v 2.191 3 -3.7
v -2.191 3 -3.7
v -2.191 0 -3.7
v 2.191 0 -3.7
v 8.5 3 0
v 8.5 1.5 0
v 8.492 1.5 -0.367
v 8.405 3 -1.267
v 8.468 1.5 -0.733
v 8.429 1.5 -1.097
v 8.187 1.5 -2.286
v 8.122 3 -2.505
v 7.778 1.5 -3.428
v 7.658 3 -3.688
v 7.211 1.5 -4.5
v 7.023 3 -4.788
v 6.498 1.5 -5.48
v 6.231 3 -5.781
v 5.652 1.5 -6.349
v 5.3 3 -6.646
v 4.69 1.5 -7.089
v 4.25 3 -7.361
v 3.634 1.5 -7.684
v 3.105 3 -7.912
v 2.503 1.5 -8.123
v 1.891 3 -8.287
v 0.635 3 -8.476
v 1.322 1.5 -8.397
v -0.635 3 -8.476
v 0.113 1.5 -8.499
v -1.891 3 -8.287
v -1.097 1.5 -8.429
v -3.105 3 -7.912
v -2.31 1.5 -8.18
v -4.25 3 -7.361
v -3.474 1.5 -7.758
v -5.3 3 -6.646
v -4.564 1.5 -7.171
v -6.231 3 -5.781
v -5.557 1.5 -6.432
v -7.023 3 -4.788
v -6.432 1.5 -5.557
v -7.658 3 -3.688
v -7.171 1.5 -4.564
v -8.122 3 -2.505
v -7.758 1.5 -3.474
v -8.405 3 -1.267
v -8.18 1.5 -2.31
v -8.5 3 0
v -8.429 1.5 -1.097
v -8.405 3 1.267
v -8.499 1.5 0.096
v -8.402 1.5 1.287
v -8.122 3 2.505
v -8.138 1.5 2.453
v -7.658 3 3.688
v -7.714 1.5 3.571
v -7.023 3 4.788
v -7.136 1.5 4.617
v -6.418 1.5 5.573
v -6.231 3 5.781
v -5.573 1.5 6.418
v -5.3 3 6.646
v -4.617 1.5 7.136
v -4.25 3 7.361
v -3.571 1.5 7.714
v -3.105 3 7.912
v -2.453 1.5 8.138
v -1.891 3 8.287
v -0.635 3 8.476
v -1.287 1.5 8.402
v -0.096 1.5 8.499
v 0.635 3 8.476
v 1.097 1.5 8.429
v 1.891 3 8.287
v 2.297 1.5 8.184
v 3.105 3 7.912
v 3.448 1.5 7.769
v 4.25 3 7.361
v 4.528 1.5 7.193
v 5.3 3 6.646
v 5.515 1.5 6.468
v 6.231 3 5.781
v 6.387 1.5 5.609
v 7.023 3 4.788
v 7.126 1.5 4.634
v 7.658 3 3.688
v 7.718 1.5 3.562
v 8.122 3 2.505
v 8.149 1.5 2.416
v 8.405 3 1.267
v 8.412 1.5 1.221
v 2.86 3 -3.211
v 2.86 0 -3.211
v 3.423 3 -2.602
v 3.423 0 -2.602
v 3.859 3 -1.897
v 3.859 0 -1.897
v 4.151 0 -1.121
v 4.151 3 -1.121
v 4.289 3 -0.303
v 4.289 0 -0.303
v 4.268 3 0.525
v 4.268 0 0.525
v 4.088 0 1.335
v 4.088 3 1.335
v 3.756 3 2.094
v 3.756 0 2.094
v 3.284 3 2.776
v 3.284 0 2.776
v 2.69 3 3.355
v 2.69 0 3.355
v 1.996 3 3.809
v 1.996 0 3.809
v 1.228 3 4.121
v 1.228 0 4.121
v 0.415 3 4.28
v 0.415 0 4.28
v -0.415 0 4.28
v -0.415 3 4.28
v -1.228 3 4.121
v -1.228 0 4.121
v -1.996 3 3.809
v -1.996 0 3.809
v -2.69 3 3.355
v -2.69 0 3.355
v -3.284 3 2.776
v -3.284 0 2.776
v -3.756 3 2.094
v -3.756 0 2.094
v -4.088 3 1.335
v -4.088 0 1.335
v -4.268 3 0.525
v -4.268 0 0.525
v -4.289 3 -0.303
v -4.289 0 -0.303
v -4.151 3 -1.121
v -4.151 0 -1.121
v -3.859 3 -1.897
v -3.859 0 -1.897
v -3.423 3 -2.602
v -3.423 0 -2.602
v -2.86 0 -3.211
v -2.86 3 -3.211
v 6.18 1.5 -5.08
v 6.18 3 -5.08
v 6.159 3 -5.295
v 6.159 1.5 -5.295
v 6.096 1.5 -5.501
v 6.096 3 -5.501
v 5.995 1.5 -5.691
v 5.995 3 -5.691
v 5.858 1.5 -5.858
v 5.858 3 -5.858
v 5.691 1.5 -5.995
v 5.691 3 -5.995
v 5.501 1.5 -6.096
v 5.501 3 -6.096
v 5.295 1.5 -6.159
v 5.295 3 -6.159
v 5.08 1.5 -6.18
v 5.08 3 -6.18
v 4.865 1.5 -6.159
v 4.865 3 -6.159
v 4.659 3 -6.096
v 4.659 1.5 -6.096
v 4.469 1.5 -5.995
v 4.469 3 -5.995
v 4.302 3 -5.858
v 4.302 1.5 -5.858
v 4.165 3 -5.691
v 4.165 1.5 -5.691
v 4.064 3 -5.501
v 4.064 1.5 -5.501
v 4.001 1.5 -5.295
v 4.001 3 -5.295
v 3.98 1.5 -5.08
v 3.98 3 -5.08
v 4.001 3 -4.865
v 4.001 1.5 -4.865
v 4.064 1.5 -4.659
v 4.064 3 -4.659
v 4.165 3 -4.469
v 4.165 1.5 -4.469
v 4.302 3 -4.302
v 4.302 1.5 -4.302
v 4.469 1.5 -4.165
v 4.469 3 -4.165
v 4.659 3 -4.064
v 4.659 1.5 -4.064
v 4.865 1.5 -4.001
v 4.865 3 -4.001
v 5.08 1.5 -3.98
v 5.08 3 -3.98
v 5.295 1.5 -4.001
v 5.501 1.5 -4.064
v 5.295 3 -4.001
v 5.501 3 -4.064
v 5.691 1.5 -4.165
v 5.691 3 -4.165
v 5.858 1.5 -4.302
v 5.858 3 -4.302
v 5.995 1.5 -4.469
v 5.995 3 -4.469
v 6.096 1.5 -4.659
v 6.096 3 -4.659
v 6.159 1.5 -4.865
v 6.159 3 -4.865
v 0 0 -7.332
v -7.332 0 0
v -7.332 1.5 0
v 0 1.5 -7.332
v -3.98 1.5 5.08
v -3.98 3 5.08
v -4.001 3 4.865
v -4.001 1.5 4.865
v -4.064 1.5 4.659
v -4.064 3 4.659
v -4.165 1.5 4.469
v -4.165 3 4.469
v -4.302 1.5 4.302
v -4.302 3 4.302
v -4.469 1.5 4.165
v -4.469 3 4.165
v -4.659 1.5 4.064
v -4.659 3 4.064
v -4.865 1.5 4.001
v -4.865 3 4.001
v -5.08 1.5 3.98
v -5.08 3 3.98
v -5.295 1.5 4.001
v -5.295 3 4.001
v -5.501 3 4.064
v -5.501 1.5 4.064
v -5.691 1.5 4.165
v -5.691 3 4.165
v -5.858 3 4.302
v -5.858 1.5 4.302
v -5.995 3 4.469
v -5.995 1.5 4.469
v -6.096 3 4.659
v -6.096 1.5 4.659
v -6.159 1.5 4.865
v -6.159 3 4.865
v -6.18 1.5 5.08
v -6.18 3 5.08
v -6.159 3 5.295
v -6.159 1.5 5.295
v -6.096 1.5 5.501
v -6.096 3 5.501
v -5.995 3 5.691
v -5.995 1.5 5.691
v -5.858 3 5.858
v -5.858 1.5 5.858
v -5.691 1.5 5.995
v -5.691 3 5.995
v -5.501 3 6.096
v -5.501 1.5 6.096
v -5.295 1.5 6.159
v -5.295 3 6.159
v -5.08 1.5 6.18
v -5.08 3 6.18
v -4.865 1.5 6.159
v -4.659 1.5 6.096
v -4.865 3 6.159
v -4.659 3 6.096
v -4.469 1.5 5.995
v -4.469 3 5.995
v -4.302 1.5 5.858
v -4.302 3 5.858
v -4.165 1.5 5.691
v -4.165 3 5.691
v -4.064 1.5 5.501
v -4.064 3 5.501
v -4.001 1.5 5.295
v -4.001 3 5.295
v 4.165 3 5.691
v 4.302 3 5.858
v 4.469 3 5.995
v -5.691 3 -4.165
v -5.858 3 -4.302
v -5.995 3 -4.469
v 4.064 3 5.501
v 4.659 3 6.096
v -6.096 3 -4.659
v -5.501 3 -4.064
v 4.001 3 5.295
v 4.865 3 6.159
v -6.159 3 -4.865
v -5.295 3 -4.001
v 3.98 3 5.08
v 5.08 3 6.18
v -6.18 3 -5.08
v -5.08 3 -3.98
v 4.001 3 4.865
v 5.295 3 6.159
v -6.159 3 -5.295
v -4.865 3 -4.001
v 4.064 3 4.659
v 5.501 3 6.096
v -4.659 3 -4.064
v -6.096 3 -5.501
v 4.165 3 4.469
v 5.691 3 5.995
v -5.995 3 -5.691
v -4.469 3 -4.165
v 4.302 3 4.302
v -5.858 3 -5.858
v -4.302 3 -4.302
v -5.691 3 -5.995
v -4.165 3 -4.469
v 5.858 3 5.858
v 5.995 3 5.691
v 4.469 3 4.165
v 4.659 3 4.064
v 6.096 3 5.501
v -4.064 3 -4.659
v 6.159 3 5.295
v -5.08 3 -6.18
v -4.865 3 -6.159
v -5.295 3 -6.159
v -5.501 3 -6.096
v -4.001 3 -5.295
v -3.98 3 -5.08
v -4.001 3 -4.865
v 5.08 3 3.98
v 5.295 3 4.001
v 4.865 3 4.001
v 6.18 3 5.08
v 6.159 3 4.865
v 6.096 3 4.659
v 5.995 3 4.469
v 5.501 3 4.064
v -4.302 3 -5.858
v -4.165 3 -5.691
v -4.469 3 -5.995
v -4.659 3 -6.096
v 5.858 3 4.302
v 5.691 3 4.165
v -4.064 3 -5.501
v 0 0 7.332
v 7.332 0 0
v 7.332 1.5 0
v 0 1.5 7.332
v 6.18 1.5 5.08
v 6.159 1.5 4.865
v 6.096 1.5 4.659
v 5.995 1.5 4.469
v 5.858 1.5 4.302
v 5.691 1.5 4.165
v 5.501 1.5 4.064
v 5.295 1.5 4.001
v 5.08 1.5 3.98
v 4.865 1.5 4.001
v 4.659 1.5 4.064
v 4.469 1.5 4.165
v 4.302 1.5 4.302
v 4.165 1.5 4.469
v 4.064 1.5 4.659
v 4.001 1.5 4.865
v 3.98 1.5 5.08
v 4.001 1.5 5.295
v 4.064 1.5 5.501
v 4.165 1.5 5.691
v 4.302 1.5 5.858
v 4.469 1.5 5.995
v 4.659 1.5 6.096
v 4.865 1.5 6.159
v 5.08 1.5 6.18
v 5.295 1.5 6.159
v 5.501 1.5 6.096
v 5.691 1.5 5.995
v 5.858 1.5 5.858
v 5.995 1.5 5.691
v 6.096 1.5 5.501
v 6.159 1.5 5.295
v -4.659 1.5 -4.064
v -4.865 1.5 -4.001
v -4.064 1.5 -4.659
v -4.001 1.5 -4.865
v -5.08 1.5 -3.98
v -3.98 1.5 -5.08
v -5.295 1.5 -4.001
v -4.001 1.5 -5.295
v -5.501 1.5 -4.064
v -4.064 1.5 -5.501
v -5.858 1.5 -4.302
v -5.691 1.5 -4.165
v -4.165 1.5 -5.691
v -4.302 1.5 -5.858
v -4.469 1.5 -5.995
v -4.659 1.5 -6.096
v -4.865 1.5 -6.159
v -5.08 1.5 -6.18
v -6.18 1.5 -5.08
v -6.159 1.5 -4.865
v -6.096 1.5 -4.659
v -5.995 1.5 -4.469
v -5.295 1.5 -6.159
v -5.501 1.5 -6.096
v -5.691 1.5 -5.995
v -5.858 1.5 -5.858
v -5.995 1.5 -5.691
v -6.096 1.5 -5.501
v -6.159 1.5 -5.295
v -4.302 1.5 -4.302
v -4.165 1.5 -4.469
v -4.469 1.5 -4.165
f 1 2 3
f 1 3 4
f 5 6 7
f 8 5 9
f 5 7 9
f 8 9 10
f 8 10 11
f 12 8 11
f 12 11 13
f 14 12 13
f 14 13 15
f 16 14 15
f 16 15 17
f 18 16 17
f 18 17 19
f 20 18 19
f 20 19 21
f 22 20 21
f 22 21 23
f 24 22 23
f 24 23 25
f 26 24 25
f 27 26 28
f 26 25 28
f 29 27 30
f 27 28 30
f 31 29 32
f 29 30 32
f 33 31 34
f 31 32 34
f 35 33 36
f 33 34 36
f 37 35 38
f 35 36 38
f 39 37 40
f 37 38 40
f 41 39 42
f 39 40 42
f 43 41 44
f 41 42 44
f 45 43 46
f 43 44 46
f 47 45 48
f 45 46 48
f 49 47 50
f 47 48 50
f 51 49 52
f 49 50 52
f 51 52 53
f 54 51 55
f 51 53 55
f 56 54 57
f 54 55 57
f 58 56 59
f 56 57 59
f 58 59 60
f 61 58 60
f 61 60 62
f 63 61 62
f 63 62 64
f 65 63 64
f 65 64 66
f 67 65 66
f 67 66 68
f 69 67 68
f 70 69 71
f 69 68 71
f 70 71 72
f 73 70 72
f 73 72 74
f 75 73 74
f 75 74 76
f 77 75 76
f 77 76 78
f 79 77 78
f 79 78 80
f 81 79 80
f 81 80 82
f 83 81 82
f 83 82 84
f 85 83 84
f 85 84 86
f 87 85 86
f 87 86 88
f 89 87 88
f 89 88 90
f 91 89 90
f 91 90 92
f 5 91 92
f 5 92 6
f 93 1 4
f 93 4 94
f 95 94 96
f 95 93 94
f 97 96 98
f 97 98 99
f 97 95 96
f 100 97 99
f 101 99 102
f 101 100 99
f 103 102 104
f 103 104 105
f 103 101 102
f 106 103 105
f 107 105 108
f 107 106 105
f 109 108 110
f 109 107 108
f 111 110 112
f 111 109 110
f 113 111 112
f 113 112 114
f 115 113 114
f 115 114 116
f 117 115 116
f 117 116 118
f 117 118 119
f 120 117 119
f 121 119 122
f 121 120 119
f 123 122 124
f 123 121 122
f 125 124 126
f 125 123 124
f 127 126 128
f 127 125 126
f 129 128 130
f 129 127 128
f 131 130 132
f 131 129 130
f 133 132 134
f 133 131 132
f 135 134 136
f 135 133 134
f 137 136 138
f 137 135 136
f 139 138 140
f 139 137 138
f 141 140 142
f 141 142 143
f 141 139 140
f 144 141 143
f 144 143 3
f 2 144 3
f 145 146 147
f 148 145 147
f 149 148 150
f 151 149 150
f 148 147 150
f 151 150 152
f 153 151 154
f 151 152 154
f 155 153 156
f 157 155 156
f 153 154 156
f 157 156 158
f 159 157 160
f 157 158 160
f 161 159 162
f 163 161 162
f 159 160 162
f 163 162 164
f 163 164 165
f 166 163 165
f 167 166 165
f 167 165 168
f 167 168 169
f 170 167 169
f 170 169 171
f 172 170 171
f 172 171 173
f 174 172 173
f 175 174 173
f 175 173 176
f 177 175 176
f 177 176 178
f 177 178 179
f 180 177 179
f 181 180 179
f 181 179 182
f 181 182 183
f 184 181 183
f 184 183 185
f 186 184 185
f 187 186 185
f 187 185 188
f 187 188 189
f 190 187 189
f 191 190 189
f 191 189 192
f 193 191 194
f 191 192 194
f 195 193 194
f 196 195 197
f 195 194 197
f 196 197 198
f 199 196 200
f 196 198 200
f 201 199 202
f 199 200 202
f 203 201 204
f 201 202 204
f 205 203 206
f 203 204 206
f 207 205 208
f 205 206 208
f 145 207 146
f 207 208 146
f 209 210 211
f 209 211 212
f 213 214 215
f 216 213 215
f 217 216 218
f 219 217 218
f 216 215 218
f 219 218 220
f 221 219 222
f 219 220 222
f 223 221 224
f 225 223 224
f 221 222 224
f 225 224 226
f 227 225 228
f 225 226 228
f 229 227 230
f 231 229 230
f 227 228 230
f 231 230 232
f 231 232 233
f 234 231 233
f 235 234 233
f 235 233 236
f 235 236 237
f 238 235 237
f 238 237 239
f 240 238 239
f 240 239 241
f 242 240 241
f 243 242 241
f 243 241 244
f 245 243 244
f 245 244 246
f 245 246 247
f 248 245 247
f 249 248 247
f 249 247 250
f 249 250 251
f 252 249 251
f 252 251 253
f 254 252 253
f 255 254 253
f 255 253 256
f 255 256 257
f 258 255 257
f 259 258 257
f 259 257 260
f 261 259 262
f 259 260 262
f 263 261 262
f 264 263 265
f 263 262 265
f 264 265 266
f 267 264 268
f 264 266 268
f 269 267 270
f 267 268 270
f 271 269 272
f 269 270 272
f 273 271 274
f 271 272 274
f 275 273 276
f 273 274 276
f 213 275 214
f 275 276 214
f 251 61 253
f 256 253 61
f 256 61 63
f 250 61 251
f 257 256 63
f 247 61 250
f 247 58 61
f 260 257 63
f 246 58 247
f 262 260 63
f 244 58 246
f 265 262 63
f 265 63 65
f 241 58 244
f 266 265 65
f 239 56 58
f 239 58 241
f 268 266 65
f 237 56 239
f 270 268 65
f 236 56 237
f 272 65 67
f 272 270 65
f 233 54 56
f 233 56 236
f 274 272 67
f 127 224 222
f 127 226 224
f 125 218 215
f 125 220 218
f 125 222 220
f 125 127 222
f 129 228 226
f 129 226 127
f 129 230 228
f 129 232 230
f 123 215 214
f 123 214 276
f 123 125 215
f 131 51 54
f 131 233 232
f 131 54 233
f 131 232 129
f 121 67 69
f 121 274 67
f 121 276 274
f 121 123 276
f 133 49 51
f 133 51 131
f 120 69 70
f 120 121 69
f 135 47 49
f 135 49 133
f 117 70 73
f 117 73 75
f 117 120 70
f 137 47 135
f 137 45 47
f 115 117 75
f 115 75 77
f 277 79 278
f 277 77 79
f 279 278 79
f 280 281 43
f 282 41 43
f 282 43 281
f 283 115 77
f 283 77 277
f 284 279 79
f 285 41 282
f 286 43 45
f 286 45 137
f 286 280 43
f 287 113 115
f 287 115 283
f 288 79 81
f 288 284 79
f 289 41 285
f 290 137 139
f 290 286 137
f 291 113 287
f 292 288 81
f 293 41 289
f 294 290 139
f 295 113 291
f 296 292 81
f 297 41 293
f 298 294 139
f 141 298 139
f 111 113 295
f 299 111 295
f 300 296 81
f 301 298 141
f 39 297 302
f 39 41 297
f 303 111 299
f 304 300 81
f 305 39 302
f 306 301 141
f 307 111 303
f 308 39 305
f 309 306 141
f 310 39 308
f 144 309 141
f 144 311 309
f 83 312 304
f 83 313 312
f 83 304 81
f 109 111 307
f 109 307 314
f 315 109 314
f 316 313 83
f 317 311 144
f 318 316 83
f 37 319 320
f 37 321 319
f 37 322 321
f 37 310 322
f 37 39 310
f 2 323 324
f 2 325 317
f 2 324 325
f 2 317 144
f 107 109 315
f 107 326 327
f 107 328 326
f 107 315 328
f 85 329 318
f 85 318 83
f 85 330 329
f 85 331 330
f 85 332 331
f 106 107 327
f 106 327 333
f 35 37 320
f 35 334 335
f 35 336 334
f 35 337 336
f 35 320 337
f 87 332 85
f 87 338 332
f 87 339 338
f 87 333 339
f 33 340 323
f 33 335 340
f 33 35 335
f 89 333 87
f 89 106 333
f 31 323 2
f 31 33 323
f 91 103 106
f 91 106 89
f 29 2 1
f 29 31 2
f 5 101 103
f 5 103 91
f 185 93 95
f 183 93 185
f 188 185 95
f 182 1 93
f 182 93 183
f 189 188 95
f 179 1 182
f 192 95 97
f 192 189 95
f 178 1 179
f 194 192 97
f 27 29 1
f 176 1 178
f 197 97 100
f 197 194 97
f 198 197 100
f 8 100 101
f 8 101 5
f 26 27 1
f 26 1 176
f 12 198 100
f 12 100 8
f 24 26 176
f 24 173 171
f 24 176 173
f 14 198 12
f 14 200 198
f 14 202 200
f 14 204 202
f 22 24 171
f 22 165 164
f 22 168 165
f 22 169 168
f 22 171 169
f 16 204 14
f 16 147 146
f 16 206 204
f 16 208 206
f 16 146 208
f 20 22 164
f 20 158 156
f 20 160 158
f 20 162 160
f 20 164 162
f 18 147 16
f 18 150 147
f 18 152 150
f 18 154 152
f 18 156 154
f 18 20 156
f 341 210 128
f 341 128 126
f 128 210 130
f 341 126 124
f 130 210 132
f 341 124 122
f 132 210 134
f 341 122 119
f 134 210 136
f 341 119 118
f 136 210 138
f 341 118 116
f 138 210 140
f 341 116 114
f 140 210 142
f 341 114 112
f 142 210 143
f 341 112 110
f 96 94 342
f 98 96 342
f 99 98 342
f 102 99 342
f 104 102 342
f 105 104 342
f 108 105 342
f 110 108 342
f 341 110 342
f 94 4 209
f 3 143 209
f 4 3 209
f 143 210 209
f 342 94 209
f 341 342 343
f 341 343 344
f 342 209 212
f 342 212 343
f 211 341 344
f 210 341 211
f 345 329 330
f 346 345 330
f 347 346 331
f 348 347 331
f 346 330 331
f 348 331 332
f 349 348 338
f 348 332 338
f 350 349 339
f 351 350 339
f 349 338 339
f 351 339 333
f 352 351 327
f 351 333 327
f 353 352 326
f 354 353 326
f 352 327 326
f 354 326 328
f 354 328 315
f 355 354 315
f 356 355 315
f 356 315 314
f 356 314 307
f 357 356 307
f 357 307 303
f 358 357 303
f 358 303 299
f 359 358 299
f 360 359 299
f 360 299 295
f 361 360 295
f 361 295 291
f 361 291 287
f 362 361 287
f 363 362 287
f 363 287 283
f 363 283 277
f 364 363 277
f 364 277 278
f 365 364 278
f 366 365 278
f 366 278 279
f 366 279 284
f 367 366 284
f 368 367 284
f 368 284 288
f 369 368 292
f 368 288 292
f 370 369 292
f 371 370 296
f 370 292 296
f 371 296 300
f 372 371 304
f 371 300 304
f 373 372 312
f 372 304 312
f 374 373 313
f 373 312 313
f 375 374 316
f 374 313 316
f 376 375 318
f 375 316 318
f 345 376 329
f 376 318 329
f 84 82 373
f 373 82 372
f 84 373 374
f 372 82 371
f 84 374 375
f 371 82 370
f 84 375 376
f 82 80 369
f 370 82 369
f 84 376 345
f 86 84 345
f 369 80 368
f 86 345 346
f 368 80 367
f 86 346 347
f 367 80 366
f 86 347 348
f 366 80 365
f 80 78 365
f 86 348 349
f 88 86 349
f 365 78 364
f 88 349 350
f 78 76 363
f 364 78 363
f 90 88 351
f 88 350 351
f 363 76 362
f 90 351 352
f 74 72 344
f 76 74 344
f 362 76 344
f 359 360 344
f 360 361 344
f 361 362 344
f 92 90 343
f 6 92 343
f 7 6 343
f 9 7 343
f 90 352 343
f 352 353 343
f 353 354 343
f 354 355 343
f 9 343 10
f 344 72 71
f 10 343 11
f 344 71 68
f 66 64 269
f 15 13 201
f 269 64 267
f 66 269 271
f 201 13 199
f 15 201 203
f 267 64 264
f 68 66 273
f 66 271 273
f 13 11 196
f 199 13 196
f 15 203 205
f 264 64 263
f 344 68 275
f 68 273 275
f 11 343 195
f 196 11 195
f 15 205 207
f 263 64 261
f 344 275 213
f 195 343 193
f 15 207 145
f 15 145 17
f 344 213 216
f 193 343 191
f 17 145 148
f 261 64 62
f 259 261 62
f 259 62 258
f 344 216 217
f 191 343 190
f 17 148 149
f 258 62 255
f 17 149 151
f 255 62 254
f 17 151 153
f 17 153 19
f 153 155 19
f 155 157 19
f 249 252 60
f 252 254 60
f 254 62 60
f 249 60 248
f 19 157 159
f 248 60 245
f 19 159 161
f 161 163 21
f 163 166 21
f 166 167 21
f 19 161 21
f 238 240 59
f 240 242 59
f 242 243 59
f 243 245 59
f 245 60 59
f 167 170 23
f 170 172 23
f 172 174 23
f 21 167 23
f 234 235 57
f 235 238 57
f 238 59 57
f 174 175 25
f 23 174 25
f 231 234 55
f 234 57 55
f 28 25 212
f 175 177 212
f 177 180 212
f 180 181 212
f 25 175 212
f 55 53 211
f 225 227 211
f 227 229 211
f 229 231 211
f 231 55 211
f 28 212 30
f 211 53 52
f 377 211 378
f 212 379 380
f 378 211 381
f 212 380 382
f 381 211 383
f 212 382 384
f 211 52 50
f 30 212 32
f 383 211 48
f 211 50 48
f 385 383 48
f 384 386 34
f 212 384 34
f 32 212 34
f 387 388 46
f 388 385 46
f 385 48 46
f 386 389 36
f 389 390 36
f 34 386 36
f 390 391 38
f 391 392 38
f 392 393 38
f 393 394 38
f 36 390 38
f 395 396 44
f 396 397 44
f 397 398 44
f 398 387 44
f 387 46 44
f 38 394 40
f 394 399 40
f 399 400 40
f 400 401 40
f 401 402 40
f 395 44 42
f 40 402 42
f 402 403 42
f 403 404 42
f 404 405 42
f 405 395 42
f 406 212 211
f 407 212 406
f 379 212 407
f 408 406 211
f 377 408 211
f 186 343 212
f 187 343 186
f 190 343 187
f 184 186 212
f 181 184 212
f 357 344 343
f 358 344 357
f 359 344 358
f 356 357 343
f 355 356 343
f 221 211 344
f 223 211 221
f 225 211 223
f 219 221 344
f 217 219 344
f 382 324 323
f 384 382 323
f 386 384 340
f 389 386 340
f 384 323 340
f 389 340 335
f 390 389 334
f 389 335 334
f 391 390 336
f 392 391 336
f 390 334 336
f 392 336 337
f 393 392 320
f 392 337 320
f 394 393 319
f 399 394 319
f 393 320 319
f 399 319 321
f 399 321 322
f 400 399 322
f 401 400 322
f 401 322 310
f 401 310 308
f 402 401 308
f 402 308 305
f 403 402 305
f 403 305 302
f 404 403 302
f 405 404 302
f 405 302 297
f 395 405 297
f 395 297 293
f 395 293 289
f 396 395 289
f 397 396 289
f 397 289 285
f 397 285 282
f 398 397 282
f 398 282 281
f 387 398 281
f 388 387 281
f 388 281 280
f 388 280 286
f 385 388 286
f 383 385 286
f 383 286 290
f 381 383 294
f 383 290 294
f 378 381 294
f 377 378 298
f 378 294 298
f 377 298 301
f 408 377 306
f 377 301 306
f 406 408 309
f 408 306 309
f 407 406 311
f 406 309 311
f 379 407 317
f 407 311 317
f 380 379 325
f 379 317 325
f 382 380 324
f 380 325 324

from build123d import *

# Parameters (mm, degrees)
SKETCH_1_R               = 8.5
EXTRUDE_1_DEPTH          = 3
CUT_EXTRUDE_1_DEPTH      = 3
SKETCH_3_R               = 1.1
CUT_EXTRUDE_2_DEPTH      = 3
CUT_EXTRUDE_3_DEPTH      = 1.5
PATTERN_CIRCULAR_1_COUNT = 4


with BuildPart() as part:
    # 스케치1 → 보스-돌출1 (new body)
    with BuildSketch(Plane(origin=(0, 0, 0), x_dir=(1, 0, 0), z_dir=(0, 1, 0))):
        Circle(SKETCH_1_R)
    extrude(amount=EXTRUDE_1_DEPTH)

    # 스케치2 → 컷-돌출1 (cut)
    with BuildSketch(Plane(origin=(0, 3, 0), x_dir=(1, 0, 0), z_dir=(0, 1, 0))):
        with BuildLine():
            Line((-2.19089023, 3.7), (2.19089023, 3.7))
            ThreePointArc((2.19089023, 3.7), (0, -4.3), (-2.19089023, 3.7))
        make_face()
    extrude(amount=-CUT_EXTRUDE_1_DEPTH, mode=Mode.SUBTRACT)

    # 스케치3 → 컷-돌출2 (cut)
    with BuildSketch(Plane(origin=(0, 3, 0), x_dir=(1, 0, 0), z_dir=(0, 1, 0))):
        with Locations((5.08, 5.08)):
            Circle(SKETCH_3_R)
        with Locations((-5.08, -5.08)):
            Circle(SKETCH_3_R)
        with Locations((5.08, -5.08)):
            Circle(SKETCH_3_R)
        with Locations((-5.08, 5.08)):
            Circle(SKETCH_3_R)
    extrude(amount=-CUT_EXTRUDE_2_DEPTH, mode=Mode.SUBTRACT)

    # 스케치4 → 컷-돌출3 (cut)
    with BuildSketch(Plane.XZ):
        with BuildLine():
            Line((1.097301825, 8.4288747), (-8.4288747, -1.097301825))
            ThreePointArc((-8.4288747, -1.097301825), (-6.01040764, 6.01040764), (1.097301825, 8.4288747))
        make_face()
    cut_extrude_3 = extrude(amount=-CUT_EXTRUDE_3_DEPTH, mode=Mode.SUBTRACT)

    # 원형 패턴1: 컷-돌출3 ×4 about axis
    pattern_circular_1_axis = Axis((0, 0, 0), (0, 1, 0))
    for i in range(1, PATTERN_CIRCULAR_1_COUNT):
        add(cut_extrude_3.rotate(pattern_circular_1_axis, i * 360 / PATTERN_CIRCULAR_1_COUNT), mode=Mode.SUBTRACT)


solid = part.part
